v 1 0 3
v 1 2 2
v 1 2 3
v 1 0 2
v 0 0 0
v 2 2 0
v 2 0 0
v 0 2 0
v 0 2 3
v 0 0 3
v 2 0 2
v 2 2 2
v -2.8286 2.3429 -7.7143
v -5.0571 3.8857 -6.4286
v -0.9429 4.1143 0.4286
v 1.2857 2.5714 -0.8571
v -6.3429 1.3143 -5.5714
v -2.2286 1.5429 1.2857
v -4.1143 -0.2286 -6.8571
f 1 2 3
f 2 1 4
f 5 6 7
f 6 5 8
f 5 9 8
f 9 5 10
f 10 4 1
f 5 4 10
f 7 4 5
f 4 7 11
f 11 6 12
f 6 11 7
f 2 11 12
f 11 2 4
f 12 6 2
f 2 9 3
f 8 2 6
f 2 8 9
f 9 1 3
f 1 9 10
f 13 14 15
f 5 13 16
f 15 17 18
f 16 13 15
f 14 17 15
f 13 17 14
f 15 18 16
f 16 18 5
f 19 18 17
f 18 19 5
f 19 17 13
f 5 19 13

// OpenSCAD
//Various lengths
cube();  //I'm fine 
cube(2); //I'm fine
cube([1]);
cube([1,2]);
cube([1,2,3]); //I'm fine
cube([1,2,3,4]);
cube([[1],2,3]);

//not numbers
cube([1,"test",3]); 
cube([1,"2",3]);
cube(["1.2","2",3]); 

square();
square(2); //I'm fine
square([1]);
square([1,2]);
square([1,2,3]);

mirror()
mirror(1)
mirror([1,2])//I'm fine
mirror([1,2,3])//I'm fine
mirror([1,2,3,4])

scale()
scale(1)//I'm fine
scale([1])
scale([1,2])  //I'm fine
scale([1,2,3])//I'm fine
scale([1,2,3,4])
cube([3,2,1]); //I'm fine

//here we have to decide how to handle it:
cube([1,-2,3]); 
cube([1/0,2,3]); 
